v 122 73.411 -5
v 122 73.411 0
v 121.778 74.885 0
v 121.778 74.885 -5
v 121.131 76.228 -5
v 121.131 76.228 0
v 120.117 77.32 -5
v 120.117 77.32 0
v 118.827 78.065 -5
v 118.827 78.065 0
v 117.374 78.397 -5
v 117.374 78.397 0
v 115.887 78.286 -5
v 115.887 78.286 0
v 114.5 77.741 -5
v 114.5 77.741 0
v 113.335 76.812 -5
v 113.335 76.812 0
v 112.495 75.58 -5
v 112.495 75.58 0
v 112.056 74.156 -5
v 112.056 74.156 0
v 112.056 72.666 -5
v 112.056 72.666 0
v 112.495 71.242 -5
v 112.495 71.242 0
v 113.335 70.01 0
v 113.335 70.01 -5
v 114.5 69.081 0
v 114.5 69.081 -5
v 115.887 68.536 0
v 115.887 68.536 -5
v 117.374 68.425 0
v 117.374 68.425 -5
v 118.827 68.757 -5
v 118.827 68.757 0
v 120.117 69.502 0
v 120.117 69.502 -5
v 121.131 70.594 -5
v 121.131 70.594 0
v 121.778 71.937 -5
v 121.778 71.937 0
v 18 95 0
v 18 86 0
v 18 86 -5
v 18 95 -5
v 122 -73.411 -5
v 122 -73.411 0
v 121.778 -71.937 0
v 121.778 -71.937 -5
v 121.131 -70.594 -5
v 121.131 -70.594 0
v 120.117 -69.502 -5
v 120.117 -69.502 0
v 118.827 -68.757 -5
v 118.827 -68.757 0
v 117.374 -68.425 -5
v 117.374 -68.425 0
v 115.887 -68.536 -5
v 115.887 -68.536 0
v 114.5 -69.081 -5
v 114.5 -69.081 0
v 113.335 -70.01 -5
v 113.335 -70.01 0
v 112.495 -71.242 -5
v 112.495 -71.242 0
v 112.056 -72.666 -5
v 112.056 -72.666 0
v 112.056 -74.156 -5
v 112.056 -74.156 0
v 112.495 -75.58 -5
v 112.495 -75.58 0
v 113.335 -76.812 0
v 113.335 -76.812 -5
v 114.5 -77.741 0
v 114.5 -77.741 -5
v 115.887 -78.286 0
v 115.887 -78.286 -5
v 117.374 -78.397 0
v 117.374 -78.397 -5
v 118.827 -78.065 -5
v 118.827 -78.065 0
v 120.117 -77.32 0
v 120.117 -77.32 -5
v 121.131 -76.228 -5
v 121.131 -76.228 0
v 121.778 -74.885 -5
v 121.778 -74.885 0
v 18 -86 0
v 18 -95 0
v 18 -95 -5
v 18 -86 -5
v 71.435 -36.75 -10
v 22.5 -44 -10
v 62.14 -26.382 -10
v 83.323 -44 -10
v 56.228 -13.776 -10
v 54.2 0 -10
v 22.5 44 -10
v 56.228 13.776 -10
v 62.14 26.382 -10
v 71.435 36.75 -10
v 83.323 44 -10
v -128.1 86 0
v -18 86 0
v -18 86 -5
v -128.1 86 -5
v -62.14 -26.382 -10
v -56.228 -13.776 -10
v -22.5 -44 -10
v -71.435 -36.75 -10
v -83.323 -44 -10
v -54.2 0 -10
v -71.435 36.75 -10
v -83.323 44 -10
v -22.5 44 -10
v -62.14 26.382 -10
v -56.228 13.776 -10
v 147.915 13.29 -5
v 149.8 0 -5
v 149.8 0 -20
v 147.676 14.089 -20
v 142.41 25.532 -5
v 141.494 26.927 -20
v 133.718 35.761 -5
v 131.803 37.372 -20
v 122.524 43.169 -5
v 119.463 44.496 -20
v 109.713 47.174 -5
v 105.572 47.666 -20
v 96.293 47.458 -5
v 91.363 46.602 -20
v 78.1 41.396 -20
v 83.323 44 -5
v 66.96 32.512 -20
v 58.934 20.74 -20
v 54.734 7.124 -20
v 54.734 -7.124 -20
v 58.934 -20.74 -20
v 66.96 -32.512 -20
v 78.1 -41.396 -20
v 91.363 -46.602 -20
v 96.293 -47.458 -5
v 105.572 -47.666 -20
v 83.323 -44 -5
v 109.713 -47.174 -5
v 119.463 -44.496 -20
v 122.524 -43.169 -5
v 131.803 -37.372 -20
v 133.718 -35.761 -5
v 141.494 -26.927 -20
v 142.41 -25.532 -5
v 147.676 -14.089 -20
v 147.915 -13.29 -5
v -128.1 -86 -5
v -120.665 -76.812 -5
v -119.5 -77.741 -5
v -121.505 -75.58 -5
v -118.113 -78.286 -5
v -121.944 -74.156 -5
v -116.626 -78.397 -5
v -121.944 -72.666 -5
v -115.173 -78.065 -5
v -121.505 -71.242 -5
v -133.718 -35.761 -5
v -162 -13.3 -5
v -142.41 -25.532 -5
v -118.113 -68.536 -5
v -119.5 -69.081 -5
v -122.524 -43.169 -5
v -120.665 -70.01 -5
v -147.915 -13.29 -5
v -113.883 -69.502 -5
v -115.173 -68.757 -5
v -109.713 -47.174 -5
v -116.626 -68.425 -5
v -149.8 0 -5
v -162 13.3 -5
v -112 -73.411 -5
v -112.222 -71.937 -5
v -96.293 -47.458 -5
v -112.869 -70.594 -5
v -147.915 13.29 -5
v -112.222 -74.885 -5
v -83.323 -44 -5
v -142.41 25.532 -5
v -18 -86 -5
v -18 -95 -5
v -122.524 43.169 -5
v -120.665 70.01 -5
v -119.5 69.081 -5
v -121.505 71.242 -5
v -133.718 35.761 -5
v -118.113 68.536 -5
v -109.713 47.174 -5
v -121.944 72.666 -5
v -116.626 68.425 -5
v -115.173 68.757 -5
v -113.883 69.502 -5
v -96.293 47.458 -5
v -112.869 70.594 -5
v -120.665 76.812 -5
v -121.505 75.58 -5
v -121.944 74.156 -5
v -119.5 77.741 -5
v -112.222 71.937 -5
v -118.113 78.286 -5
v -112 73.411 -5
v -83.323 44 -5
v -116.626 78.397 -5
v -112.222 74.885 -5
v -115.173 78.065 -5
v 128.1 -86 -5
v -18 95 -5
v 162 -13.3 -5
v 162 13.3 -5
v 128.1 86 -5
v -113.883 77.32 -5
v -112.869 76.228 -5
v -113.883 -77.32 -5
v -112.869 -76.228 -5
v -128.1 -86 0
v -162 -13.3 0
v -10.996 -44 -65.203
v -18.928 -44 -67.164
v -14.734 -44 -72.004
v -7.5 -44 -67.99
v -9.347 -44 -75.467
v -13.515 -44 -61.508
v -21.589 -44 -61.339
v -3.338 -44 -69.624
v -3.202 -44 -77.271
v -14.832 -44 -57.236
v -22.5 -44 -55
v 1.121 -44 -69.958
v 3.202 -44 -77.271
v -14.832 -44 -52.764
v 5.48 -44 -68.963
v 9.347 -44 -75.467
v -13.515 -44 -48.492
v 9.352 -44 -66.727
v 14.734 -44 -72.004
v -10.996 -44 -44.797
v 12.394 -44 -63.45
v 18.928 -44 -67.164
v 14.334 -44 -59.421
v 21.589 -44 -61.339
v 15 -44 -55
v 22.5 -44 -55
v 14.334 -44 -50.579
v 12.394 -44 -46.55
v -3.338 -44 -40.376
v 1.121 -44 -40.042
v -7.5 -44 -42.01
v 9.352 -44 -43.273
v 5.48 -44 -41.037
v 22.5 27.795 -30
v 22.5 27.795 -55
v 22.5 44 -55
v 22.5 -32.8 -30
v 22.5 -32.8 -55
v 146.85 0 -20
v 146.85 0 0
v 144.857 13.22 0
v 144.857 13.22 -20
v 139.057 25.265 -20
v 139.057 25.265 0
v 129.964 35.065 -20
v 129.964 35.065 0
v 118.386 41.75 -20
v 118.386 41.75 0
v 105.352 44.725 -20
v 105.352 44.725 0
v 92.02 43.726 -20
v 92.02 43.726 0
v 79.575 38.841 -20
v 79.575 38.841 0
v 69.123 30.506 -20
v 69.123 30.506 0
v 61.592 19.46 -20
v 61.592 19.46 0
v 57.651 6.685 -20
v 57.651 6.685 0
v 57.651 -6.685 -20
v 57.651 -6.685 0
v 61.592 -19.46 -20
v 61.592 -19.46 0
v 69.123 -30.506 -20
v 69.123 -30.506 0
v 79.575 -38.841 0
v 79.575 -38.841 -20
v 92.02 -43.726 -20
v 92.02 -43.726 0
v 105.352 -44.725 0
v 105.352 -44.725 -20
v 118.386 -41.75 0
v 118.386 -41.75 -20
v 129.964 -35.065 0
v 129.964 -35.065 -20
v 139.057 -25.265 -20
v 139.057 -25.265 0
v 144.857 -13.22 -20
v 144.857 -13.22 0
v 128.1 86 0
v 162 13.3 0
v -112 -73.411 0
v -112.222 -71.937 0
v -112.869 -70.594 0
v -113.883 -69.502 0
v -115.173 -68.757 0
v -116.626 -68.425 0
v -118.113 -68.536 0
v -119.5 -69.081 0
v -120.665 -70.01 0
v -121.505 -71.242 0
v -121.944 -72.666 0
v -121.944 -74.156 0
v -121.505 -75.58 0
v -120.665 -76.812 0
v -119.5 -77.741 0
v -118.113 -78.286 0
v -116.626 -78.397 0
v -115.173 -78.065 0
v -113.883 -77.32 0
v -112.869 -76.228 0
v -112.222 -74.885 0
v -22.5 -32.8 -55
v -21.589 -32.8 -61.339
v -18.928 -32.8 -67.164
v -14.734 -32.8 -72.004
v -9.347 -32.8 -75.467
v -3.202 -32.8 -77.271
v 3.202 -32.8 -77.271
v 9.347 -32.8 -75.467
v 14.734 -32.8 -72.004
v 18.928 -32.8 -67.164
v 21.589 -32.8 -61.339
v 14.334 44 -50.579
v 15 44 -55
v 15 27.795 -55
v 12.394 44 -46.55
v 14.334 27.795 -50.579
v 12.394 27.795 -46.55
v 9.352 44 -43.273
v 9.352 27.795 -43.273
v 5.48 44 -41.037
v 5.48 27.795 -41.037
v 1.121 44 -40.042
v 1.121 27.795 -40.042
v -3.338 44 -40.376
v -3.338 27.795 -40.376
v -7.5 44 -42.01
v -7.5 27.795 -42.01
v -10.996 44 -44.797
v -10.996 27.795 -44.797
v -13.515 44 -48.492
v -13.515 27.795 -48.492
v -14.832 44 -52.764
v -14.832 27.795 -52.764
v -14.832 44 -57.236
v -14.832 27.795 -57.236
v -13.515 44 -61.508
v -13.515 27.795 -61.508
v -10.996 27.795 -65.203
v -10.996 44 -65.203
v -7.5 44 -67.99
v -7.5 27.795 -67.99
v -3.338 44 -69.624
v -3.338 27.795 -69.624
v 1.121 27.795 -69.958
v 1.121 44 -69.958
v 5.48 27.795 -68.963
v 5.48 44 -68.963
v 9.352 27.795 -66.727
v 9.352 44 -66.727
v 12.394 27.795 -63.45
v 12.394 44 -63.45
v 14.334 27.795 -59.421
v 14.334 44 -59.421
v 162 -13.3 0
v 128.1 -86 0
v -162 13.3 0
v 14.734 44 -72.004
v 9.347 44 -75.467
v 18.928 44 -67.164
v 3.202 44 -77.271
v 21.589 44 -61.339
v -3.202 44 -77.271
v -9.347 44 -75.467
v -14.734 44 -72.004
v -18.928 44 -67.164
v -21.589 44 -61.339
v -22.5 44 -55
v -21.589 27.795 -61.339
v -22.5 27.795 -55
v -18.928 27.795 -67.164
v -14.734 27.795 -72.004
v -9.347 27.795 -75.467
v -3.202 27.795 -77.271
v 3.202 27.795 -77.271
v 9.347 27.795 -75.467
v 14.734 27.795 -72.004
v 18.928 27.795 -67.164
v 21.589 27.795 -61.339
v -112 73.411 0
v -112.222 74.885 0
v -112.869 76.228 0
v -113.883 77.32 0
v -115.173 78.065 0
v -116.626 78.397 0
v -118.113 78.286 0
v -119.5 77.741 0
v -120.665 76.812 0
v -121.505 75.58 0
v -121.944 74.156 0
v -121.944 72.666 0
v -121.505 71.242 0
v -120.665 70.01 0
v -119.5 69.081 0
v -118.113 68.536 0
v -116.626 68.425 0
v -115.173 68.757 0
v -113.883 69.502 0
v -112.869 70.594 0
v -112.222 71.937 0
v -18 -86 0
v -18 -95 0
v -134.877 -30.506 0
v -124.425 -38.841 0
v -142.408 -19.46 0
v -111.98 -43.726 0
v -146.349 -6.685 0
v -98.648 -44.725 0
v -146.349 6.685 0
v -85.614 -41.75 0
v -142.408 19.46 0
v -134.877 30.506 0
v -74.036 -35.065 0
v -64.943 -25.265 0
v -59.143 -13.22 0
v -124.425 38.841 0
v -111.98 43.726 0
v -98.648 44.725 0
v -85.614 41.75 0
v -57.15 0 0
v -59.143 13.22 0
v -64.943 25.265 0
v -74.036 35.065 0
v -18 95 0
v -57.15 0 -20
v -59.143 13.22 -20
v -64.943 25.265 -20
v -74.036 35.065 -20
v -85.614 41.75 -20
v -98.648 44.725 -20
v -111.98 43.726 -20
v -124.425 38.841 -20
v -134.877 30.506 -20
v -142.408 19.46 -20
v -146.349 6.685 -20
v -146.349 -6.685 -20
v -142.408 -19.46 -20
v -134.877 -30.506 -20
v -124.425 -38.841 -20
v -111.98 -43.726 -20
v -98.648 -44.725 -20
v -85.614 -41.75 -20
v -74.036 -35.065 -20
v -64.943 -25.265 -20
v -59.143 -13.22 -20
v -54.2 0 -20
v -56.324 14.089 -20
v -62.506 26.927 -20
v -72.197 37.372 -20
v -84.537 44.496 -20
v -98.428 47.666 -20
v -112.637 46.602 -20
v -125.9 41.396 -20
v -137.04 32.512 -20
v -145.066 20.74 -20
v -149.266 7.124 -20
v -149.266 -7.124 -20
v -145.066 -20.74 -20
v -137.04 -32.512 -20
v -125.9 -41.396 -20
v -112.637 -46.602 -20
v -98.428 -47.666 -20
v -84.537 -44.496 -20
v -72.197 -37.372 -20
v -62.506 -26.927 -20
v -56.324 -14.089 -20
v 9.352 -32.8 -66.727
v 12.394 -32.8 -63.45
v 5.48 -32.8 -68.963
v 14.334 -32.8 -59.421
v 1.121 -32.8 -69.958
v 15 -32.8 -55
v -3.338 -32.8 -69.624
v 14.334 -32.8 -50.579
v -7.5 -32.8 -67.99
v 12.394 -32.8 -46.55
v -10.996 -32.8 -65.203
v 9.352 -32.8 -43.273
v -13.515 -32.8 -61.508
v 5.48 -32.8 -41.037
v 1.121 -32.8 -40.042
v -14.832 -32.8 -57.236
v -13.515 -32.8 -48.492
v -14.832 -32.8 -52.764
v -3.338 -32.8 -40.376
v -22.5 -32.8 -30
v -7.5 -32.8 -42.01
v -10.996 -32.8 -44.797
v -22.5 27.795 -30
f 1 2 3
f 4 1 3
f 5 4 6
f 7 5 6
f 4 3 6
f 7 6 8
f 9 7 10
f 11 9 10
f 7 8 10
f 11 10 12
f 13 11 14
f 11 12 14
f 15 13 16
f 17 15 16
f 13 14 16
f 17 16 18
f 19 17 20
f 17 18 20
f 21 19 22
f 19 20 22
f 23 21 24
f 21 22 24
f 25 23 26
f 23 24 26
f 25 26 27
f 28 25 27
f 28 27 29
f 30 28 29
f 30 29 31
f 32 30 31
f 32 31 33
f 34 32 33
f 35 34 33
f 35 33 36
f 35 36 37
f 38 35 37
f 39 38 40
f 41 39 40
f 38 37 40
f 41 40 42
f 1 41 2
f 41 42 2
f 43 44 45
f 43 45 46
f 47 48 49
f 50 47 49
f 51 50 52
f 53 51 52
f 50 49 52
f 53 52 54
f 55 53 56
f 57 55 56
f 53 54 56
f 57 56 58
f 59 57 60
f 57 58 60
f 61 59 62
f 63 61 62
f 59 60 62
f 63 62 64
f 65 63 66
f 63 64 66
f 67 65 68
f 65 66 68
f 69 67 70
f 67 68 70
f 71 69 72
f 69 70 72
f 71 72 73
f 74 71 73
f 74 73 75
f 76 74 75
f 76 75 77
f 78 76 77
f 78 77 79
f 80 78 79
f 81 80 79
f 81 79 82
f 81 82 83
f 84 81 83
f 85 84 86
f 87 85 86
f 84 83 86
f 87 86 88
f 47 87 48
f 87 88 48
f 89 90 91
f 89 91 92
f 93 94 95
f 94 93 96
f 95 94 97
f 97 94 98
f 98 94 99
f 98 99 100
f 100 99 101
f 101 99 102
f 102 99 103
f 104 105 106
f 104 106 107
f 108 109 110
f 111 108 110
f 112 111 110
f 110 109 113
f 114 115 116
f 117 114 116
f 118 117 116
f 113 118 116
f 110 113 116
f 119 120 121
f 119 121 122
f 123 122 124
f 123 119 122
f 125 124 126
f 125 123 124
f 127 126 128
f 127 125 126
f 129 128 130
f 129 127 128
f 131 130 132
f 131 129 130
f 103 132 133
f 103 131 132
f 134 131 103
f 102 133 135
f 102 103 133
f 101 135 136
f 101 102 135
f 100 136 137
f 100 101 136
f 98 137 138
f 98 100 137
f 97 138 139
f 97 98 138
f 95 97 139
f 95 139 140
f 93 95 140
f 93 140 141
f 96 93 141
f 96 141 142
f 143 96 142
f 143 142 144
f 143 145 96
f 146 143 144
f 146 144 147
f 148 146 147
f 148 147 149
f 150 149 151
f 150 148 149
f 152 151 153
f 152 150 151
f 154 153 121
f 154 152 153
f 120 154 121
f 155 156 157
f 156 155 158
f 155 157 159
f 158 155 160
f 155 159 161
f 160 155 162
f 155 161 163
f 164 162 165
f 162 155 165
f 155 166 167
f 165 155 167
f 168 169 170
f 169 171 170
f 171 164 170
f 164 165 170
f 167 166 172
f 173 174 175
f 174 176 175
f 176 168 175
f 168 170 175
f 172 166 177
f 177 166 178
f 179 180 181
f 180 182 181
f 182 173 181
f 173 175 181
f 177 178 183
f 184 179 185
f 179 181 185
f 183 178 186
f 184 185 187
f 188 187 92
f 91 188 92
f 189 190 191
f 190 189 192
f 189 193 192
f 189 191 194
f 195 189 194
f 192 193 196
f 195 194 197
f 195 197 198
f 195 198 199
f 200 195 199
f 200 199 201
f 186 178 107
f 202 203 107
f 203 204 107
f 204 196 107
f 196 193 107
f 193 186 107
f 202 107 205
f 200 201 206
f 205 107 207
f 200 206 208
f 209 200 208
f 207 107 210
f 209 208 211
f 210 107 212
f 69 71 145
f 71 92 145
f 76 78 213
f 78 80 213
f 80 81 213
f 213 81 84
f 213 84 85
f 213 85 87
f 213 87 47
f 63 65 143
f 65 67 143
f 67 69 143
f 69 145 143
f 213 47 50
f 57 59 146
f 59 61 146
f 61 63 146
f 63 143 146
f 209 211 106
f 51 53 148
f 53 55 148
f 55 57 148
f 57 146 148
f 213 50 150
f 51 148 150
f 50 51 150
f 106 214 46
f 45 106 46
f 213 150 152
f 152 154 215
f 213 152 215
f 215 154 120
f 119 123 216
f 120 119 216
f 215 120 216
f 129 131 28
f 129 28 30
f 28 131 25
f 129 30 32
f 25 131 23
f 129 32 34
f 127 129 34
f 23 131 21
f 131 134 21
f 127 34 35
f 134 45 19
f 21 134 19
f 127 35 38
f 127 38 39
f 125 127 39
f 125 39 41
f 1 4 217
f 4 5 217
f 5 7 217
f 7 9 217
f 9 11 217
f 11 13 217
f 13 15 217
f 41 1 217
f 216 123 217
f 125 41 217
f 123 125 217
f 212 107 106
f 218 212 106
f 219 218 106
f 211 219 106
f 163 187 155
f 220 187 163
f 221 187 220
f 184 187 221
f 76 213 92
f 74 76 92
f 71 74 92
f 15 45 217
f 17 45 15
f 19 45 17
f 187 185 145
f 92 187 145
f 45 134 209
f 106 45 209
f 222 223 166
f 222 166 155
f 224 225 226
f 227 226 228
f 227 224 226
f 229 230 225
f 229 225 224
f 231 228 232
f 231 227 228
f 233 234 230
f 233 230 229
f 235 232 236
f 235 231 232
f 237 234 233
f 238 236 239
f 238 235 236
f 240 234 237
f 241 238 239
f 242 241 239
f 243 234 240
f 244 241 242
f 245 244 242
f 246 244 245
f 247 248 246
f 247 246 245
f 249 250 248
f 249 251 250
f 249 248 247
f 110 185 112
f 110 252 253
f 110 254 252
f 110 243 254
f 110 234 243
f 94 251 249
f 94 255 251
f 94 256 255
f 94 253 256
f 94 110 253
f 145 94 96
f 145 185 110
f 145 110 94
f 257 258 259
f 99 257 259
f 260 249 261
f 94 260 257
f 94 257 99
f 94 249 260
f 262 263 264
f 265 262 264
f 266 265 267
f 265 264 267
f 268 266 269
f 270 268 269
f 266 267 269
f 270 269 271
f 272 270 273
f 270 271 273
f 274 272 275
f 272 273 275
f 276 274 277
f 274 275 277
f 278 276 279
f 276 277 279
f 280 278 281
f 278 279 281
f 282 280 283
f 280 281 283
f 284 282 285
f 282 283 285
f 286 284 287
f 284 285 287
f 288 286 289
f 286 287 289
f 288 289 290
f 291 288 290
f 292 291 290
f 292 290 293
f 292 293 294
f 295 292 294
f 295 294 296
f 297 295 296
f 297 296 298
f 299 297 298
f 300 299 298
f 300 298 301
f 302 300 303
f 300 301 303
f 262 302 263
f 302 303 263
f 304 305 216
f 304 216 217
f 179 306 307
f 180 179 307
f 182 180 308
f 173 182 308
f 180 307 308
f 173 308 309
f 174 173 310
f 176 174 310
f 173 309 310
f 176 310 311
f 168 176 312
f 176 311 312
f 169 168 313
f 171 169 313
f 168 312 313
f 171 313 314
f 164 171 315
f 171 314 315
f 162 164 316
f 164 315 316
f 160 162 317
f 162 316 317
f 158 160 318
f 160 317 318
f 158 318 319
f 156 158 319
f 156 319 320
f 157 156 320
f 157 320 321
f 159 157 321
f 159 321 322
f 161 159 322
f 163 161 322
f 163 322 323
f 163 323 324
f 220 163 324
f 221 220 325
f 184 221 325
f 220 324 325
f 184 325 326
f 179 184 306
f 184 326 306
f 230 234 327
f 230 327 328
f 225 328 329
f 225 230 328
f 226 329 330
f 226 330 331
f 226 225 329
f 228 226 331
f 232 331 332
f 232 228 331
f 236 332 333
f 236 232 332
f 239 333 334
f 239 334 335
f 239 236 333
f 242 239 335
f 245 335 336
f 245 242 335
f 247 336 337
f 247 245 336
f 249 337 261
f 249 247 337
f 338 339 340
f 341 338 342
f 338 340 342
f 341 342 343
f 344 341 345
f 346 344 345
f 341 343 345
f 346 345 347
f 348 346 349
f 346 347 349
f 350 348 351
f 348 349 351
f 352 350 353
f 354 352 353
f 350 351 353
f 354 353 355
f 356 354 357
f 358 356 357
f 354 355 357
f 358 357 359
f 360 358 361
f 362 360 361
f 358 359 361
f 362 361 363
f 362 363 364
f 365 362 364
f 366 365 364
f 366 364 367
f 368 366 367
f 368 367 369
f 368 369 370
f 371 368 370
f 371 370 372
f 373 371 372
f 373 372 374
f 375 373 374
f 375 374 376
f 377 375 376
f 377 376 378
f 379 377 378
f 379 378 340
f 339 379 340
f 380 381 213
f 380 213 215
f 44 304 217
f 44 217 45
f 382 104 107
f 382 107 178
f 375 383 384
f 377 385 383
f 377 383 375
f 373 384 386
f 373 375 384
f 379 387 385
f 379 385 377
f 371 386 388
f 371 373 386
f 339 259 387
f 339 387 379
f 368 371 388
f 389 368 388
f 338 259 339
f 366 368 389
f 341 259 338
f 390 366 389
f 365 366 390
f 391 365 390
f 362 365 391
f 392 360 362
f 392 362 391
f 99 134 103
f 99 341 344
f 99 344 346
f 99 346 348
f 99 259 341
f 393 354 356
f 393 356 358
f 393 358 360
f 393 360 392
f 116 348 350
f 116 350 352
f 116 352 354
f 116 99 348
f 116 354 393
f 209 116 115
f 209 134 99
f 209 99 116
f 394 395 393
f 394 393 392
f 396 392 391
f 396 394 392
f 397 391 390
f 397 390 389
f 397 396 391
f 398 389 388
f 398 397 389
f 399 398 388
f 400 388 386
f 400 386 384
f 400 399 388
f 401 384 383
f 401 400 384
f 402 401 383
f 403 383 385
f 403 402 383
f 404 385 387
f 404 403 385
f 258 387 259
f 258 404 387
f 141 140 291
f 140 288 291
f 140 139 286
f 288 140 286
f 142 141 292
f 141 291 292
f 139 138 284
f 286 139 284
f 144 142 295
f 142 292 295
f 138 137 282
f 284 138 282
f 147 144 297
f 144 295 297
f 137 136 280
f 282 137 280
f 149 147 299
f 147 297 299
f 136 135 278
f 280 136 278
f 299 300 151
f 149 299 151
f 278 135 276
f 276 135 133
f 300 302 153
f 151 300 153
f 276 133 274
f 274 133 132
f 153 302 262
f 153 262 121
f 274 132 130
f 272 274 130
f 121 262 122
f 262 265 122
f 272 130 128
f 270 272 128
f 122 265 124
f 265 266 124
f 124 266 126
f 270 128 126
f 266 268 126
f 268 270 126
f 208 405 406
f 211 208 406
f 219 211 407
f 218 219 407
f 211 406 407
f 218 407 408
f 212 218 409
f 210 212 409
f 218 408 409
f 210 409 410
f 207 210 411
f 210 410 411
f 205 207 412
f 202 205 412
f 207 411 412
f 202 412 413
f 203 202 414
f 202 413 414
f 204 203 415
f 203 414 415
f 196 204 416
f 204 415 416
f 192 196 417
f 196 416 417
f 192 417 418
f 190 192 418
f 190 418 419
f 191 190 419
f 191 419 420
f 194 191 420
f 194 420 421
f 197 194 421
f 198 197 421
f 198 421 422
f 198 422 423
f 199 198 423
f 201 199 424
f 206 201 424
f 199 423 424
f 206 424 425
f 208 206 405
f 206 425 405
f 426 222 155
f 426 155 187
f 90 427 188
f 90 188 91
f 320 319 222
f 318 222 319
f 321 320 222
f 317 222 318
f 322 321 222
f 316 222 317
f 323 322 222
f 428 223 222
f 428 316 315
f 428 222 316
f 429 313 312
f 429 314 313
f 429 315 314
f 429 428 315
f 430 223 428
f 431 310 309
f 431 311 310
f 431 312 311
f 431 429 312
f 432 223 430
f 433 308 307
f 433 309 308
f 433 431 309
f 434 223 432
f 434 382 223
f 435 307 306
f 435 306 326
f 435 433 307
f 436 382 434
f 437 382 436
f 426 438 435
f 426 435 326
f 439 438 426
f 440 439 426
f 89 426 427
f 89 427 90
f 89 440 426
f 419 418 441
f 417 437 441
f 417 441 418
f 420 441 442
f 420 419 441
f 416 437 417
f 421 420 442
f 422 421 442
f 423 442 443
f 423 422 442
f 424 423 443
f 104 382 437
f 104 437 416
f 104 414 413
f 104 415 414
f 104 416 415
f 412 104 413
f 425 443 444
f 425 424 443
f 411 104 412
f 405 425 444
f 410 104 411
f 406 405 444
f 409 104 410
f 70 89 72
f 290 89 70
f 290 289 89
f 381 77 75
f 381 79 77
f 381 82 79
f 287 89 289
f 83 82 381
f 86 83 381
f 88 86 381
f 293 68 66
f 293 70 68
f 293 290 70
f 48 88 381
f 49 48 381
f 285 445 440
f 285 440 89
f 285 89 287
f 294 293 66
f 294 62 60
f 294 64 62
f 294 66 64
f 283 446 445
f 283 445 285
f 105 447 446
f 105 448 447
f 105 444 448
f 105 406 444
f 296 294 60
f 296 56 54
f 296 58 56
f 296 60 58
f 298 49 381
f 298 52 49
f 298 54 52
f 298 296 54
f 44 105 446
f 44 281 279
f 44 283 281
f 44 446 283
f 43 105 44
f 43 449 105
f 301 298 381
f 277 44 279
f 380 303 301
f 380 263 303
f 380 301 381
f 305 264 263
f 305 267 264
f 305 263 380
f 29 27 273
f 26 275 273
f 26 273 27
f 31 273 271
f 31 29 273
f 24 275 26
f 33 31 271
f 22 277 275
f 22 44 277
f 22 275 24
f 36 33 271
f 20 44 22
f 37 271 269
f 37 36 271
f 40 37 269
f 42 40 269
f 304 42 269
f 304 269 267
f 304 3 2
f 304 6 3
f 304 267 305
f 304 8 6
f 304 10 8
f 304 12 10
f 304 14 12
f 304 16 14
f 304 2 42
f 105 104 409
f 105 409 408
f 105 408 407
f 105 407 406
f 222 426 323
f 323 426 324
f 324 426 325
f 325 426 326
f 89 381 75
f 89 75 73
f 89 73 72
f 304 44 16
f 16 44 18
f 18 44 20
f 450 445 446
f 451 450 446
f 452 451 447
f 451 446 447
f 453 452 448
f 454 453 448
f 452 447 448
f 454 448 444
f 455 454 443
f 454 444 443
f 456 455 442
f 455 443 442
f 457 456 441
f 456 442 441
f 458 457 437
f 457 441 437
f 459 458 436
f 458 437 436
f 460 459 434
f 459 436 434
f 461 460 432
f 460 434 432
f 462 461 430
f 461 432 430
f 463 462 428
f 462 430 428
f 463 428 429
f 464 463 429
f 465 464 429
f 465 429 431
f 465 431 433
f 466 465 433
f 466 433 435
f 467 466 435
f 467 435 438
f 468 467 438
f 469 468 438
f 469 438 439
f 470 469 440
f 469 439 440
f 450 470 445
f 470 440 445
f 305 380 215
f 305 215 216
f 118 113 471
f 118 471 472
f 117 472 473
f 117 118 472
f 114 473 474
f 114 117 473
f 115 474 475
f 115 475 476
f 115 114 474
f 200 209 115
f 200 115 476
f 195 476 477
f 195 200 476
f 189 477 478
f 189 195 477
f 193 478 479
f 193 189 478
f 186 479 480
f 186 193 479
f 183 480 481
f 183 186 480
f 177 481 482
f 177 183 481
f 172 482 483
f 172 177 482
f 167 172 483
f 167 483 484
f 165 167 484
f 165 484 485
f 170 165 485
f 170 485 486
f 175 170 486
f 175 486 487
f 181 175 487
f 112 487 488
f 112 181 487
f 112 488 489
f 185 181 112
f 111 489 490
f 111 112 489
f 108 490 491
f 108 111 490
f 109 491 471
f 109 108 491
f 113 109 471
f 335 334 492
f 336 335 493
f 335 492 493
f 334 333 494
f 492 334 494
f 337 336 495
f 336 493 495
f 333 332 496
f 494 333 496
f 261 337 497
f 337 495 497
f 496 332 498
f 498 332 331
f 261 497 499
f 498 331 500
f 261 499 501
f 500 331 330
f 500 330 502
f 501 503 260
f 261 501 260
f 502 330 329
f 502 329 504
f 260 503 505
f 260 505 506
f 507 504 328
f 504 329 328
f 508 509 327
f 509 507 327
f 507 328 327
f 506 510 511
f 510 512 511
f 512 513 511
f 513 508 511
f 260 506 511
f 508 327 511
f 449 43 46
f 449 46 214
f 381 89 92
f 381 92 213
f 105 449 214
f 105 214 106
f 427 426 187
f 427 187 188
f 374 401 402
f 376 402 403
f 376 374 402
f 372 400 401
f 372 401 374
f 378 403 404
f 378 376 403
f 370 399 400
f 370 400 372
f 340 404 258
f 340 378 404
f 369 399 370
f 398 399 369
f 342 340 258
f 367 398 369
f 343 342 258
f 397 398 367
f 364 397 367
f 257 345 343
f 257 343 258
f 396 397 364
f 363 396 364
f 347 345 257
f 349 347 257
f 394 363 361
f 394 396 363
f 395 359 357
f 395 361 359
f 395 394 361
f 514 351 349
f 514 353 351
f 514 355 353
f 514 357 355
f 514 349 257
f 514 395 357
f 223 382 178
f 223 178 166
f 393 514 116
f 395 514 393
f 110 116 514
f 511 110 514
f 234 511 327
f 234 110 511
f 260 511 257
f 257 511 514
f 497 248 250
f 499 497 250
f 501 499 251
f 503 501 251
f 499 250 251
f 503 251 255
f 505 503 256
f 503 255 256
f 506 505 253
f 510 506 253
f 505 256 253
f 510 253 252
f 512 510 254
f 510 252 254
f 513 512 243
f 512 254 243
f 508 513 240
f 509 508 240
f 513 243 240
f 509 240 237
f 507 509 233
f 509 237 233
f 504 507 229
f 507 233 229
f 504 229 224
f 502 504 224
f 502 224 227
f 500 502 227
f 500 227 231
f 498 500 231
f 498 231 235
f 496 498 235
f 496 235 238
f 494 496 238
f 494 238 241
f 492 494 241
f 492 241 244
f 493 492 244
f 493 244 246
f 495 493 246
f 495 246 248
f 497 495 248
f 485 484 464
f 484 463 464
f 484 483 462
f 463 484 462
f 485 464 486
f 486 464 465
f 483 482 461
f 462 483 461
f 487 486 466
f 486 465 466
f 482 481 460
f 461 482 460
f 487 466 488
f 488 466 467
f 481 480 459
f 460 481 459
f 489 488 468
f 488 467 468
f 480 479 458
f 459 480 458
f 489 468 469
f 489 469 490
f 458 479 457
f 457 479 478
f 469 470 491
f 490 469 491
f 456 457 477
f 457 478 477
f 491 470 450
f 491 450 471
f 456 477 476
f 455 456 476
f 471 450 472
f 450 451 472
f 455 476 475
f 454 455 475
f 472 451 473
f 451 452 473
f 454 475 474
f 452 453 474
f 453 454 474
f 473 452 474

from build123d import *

# Parameters (mm, degrees)
SKETCH1_R           = 5
BOSS_EXTRUDE3_DEPTH = 5
BOSS_EXTRUDE4_DEPTH = 10
SKETCH1_6_R         = 47.8
SKETCH1_6_R_2       = 44.85
BOSS_EXTRUDE5_DEPTH = 20
SKETCH2_R           = 15
BOSS_EXTRUDE6_DEPTH = 88
SKETCH3_W           = 90.131554877
SKETCH3_H           = 60.595357862
CUT_EXTRUDE1_DEPTH  = 57


with BuildPart() as part:
    # Sketch1 → Boss-Extrude3 (new body)
    with BuildSketch(Plane.XY):
        Polygon((-18, 86), (-128.1, 86), (-162, 13.3), (-162, -13.3), (-128.1, -86), (-18, -86), (-18, -95), (18, -95), (18, -86), (128.1, -86), (162, -13.3), (162, 13.3), (128.1, 86), (18, 86), (18, 95), (-18, 95), align=None)
        with Locations((-117, -73.410936815)):
            Circle(SKETCH1_R, mode=Mode.SUBTRACT)
        with Locations((117, -73.410936815)):
            Circle(SKETCH1_R, mode=Mode.SUBTRACT)
        with BuildLine():
            ThreePointArc((-83.3227411, -44), (-149.8, 0), (-83.3227411, 44))
            Line((-83.3227411, 44), (83.3227411, 44))
            ThreePointArc((83.3227411, 44), (128.382447049, 39.85983552), (149.8, 0))
            ThreePointArc((149.8, 0), (128.382447049, -39.85983552), (83.3227411, -44))
            Line((83.3227411, -44), (-83.3227411, -44))
        make_face(mode=Mode.SUBTRACT)
        with Locations((-117, 73.410936815)):
            Circle(SKETCH1_R, mode=Mode.SUBTRACT)
        with Locations((117, 73.410936815)):
            Circle(SKETCH1_R, mode=Mode.SUBTRACT)
    extrude(amount=-BOSS_EXTRUDE3_DEPTH)

    # Sketch1<5> → Boss-Extrude4 (add)
    with BuildSketch(Plane.XY):
        with BuildLine():
            Line((83.3227411, 44), (-83.3227411, 44))
            ThreePointArc((-83.3227411, 44), (-62.14016448, 26.382447049), (-54.2, 0))
            ThreePointArc((-54.2, 0), (-62.14016448, -26.382447049), (-83.3227411, -44))
            Line((-83.3227411, -44), (83.3227411, -44))
            ThreePointArc((83.3227411, -44), (54.2, 0), (83.3227411, 44))
        make_face()
    extrude(amount=-BOSS_EXTRUDE4_DEPTH)

    # Sketch1<6> → Boss-Extrude5 (add)
    # profile 1 of 2: a face of its own
    with BuildSketch(Plane.XY):
        with Locations((102, 0)):
            Circle(SKETCH1_6_R)
        with Locations((102, 0)):
            Circle(SKETCH1_6_R_2, mode=Mode.SUBTRACT)
    # profile 2 of 2: a face of its own
    with BuildSketch(Plane.XY):
        with Locations((-102, 0)):
            Circle(SKETCH1_6_R)
        with Locations((-102, 0)):
            Circle(SKETCH1_6_R_2, mode=Mode.SUBTRACT)
    extrude(amount=-BOSS_EXTRUDE5_DEPTH)

    # Sketch2 → Boss-Extrude6 (add)
    with BuildSketch(Plane.XZ.offset(44)):
        with BuildLine():
            Line((22.5, -55), (22.5, -10))
            Line((22.5, -10), (-22.5, -10))
            Line((-22.5, -10), (-22.5, -55))
            ThreePointArc((-22.5, -55), (0, -77.5), (22.5, -55))
        make_face()
        with Locations((0, -55)):
            Circle(SKETCH2_R, mode=Mode.SUBTRACT)
    extrude(amount=-BOSS_EXTRUDE6_DEPTH)

    # Sketch3 → Cut-Extrude1 (cut)
    with BuildSketch(Plane.ZY.offset(22.5)):
        with Locations((-75.065777439, -2.502321069)):
            Rectangle(SKETCH3_W, SKETCH3_H)
    extrude(amount=-CUT_EXTRUDE1_DEPTH, mode=Mode.SUBTRACT)


solid = part.part
